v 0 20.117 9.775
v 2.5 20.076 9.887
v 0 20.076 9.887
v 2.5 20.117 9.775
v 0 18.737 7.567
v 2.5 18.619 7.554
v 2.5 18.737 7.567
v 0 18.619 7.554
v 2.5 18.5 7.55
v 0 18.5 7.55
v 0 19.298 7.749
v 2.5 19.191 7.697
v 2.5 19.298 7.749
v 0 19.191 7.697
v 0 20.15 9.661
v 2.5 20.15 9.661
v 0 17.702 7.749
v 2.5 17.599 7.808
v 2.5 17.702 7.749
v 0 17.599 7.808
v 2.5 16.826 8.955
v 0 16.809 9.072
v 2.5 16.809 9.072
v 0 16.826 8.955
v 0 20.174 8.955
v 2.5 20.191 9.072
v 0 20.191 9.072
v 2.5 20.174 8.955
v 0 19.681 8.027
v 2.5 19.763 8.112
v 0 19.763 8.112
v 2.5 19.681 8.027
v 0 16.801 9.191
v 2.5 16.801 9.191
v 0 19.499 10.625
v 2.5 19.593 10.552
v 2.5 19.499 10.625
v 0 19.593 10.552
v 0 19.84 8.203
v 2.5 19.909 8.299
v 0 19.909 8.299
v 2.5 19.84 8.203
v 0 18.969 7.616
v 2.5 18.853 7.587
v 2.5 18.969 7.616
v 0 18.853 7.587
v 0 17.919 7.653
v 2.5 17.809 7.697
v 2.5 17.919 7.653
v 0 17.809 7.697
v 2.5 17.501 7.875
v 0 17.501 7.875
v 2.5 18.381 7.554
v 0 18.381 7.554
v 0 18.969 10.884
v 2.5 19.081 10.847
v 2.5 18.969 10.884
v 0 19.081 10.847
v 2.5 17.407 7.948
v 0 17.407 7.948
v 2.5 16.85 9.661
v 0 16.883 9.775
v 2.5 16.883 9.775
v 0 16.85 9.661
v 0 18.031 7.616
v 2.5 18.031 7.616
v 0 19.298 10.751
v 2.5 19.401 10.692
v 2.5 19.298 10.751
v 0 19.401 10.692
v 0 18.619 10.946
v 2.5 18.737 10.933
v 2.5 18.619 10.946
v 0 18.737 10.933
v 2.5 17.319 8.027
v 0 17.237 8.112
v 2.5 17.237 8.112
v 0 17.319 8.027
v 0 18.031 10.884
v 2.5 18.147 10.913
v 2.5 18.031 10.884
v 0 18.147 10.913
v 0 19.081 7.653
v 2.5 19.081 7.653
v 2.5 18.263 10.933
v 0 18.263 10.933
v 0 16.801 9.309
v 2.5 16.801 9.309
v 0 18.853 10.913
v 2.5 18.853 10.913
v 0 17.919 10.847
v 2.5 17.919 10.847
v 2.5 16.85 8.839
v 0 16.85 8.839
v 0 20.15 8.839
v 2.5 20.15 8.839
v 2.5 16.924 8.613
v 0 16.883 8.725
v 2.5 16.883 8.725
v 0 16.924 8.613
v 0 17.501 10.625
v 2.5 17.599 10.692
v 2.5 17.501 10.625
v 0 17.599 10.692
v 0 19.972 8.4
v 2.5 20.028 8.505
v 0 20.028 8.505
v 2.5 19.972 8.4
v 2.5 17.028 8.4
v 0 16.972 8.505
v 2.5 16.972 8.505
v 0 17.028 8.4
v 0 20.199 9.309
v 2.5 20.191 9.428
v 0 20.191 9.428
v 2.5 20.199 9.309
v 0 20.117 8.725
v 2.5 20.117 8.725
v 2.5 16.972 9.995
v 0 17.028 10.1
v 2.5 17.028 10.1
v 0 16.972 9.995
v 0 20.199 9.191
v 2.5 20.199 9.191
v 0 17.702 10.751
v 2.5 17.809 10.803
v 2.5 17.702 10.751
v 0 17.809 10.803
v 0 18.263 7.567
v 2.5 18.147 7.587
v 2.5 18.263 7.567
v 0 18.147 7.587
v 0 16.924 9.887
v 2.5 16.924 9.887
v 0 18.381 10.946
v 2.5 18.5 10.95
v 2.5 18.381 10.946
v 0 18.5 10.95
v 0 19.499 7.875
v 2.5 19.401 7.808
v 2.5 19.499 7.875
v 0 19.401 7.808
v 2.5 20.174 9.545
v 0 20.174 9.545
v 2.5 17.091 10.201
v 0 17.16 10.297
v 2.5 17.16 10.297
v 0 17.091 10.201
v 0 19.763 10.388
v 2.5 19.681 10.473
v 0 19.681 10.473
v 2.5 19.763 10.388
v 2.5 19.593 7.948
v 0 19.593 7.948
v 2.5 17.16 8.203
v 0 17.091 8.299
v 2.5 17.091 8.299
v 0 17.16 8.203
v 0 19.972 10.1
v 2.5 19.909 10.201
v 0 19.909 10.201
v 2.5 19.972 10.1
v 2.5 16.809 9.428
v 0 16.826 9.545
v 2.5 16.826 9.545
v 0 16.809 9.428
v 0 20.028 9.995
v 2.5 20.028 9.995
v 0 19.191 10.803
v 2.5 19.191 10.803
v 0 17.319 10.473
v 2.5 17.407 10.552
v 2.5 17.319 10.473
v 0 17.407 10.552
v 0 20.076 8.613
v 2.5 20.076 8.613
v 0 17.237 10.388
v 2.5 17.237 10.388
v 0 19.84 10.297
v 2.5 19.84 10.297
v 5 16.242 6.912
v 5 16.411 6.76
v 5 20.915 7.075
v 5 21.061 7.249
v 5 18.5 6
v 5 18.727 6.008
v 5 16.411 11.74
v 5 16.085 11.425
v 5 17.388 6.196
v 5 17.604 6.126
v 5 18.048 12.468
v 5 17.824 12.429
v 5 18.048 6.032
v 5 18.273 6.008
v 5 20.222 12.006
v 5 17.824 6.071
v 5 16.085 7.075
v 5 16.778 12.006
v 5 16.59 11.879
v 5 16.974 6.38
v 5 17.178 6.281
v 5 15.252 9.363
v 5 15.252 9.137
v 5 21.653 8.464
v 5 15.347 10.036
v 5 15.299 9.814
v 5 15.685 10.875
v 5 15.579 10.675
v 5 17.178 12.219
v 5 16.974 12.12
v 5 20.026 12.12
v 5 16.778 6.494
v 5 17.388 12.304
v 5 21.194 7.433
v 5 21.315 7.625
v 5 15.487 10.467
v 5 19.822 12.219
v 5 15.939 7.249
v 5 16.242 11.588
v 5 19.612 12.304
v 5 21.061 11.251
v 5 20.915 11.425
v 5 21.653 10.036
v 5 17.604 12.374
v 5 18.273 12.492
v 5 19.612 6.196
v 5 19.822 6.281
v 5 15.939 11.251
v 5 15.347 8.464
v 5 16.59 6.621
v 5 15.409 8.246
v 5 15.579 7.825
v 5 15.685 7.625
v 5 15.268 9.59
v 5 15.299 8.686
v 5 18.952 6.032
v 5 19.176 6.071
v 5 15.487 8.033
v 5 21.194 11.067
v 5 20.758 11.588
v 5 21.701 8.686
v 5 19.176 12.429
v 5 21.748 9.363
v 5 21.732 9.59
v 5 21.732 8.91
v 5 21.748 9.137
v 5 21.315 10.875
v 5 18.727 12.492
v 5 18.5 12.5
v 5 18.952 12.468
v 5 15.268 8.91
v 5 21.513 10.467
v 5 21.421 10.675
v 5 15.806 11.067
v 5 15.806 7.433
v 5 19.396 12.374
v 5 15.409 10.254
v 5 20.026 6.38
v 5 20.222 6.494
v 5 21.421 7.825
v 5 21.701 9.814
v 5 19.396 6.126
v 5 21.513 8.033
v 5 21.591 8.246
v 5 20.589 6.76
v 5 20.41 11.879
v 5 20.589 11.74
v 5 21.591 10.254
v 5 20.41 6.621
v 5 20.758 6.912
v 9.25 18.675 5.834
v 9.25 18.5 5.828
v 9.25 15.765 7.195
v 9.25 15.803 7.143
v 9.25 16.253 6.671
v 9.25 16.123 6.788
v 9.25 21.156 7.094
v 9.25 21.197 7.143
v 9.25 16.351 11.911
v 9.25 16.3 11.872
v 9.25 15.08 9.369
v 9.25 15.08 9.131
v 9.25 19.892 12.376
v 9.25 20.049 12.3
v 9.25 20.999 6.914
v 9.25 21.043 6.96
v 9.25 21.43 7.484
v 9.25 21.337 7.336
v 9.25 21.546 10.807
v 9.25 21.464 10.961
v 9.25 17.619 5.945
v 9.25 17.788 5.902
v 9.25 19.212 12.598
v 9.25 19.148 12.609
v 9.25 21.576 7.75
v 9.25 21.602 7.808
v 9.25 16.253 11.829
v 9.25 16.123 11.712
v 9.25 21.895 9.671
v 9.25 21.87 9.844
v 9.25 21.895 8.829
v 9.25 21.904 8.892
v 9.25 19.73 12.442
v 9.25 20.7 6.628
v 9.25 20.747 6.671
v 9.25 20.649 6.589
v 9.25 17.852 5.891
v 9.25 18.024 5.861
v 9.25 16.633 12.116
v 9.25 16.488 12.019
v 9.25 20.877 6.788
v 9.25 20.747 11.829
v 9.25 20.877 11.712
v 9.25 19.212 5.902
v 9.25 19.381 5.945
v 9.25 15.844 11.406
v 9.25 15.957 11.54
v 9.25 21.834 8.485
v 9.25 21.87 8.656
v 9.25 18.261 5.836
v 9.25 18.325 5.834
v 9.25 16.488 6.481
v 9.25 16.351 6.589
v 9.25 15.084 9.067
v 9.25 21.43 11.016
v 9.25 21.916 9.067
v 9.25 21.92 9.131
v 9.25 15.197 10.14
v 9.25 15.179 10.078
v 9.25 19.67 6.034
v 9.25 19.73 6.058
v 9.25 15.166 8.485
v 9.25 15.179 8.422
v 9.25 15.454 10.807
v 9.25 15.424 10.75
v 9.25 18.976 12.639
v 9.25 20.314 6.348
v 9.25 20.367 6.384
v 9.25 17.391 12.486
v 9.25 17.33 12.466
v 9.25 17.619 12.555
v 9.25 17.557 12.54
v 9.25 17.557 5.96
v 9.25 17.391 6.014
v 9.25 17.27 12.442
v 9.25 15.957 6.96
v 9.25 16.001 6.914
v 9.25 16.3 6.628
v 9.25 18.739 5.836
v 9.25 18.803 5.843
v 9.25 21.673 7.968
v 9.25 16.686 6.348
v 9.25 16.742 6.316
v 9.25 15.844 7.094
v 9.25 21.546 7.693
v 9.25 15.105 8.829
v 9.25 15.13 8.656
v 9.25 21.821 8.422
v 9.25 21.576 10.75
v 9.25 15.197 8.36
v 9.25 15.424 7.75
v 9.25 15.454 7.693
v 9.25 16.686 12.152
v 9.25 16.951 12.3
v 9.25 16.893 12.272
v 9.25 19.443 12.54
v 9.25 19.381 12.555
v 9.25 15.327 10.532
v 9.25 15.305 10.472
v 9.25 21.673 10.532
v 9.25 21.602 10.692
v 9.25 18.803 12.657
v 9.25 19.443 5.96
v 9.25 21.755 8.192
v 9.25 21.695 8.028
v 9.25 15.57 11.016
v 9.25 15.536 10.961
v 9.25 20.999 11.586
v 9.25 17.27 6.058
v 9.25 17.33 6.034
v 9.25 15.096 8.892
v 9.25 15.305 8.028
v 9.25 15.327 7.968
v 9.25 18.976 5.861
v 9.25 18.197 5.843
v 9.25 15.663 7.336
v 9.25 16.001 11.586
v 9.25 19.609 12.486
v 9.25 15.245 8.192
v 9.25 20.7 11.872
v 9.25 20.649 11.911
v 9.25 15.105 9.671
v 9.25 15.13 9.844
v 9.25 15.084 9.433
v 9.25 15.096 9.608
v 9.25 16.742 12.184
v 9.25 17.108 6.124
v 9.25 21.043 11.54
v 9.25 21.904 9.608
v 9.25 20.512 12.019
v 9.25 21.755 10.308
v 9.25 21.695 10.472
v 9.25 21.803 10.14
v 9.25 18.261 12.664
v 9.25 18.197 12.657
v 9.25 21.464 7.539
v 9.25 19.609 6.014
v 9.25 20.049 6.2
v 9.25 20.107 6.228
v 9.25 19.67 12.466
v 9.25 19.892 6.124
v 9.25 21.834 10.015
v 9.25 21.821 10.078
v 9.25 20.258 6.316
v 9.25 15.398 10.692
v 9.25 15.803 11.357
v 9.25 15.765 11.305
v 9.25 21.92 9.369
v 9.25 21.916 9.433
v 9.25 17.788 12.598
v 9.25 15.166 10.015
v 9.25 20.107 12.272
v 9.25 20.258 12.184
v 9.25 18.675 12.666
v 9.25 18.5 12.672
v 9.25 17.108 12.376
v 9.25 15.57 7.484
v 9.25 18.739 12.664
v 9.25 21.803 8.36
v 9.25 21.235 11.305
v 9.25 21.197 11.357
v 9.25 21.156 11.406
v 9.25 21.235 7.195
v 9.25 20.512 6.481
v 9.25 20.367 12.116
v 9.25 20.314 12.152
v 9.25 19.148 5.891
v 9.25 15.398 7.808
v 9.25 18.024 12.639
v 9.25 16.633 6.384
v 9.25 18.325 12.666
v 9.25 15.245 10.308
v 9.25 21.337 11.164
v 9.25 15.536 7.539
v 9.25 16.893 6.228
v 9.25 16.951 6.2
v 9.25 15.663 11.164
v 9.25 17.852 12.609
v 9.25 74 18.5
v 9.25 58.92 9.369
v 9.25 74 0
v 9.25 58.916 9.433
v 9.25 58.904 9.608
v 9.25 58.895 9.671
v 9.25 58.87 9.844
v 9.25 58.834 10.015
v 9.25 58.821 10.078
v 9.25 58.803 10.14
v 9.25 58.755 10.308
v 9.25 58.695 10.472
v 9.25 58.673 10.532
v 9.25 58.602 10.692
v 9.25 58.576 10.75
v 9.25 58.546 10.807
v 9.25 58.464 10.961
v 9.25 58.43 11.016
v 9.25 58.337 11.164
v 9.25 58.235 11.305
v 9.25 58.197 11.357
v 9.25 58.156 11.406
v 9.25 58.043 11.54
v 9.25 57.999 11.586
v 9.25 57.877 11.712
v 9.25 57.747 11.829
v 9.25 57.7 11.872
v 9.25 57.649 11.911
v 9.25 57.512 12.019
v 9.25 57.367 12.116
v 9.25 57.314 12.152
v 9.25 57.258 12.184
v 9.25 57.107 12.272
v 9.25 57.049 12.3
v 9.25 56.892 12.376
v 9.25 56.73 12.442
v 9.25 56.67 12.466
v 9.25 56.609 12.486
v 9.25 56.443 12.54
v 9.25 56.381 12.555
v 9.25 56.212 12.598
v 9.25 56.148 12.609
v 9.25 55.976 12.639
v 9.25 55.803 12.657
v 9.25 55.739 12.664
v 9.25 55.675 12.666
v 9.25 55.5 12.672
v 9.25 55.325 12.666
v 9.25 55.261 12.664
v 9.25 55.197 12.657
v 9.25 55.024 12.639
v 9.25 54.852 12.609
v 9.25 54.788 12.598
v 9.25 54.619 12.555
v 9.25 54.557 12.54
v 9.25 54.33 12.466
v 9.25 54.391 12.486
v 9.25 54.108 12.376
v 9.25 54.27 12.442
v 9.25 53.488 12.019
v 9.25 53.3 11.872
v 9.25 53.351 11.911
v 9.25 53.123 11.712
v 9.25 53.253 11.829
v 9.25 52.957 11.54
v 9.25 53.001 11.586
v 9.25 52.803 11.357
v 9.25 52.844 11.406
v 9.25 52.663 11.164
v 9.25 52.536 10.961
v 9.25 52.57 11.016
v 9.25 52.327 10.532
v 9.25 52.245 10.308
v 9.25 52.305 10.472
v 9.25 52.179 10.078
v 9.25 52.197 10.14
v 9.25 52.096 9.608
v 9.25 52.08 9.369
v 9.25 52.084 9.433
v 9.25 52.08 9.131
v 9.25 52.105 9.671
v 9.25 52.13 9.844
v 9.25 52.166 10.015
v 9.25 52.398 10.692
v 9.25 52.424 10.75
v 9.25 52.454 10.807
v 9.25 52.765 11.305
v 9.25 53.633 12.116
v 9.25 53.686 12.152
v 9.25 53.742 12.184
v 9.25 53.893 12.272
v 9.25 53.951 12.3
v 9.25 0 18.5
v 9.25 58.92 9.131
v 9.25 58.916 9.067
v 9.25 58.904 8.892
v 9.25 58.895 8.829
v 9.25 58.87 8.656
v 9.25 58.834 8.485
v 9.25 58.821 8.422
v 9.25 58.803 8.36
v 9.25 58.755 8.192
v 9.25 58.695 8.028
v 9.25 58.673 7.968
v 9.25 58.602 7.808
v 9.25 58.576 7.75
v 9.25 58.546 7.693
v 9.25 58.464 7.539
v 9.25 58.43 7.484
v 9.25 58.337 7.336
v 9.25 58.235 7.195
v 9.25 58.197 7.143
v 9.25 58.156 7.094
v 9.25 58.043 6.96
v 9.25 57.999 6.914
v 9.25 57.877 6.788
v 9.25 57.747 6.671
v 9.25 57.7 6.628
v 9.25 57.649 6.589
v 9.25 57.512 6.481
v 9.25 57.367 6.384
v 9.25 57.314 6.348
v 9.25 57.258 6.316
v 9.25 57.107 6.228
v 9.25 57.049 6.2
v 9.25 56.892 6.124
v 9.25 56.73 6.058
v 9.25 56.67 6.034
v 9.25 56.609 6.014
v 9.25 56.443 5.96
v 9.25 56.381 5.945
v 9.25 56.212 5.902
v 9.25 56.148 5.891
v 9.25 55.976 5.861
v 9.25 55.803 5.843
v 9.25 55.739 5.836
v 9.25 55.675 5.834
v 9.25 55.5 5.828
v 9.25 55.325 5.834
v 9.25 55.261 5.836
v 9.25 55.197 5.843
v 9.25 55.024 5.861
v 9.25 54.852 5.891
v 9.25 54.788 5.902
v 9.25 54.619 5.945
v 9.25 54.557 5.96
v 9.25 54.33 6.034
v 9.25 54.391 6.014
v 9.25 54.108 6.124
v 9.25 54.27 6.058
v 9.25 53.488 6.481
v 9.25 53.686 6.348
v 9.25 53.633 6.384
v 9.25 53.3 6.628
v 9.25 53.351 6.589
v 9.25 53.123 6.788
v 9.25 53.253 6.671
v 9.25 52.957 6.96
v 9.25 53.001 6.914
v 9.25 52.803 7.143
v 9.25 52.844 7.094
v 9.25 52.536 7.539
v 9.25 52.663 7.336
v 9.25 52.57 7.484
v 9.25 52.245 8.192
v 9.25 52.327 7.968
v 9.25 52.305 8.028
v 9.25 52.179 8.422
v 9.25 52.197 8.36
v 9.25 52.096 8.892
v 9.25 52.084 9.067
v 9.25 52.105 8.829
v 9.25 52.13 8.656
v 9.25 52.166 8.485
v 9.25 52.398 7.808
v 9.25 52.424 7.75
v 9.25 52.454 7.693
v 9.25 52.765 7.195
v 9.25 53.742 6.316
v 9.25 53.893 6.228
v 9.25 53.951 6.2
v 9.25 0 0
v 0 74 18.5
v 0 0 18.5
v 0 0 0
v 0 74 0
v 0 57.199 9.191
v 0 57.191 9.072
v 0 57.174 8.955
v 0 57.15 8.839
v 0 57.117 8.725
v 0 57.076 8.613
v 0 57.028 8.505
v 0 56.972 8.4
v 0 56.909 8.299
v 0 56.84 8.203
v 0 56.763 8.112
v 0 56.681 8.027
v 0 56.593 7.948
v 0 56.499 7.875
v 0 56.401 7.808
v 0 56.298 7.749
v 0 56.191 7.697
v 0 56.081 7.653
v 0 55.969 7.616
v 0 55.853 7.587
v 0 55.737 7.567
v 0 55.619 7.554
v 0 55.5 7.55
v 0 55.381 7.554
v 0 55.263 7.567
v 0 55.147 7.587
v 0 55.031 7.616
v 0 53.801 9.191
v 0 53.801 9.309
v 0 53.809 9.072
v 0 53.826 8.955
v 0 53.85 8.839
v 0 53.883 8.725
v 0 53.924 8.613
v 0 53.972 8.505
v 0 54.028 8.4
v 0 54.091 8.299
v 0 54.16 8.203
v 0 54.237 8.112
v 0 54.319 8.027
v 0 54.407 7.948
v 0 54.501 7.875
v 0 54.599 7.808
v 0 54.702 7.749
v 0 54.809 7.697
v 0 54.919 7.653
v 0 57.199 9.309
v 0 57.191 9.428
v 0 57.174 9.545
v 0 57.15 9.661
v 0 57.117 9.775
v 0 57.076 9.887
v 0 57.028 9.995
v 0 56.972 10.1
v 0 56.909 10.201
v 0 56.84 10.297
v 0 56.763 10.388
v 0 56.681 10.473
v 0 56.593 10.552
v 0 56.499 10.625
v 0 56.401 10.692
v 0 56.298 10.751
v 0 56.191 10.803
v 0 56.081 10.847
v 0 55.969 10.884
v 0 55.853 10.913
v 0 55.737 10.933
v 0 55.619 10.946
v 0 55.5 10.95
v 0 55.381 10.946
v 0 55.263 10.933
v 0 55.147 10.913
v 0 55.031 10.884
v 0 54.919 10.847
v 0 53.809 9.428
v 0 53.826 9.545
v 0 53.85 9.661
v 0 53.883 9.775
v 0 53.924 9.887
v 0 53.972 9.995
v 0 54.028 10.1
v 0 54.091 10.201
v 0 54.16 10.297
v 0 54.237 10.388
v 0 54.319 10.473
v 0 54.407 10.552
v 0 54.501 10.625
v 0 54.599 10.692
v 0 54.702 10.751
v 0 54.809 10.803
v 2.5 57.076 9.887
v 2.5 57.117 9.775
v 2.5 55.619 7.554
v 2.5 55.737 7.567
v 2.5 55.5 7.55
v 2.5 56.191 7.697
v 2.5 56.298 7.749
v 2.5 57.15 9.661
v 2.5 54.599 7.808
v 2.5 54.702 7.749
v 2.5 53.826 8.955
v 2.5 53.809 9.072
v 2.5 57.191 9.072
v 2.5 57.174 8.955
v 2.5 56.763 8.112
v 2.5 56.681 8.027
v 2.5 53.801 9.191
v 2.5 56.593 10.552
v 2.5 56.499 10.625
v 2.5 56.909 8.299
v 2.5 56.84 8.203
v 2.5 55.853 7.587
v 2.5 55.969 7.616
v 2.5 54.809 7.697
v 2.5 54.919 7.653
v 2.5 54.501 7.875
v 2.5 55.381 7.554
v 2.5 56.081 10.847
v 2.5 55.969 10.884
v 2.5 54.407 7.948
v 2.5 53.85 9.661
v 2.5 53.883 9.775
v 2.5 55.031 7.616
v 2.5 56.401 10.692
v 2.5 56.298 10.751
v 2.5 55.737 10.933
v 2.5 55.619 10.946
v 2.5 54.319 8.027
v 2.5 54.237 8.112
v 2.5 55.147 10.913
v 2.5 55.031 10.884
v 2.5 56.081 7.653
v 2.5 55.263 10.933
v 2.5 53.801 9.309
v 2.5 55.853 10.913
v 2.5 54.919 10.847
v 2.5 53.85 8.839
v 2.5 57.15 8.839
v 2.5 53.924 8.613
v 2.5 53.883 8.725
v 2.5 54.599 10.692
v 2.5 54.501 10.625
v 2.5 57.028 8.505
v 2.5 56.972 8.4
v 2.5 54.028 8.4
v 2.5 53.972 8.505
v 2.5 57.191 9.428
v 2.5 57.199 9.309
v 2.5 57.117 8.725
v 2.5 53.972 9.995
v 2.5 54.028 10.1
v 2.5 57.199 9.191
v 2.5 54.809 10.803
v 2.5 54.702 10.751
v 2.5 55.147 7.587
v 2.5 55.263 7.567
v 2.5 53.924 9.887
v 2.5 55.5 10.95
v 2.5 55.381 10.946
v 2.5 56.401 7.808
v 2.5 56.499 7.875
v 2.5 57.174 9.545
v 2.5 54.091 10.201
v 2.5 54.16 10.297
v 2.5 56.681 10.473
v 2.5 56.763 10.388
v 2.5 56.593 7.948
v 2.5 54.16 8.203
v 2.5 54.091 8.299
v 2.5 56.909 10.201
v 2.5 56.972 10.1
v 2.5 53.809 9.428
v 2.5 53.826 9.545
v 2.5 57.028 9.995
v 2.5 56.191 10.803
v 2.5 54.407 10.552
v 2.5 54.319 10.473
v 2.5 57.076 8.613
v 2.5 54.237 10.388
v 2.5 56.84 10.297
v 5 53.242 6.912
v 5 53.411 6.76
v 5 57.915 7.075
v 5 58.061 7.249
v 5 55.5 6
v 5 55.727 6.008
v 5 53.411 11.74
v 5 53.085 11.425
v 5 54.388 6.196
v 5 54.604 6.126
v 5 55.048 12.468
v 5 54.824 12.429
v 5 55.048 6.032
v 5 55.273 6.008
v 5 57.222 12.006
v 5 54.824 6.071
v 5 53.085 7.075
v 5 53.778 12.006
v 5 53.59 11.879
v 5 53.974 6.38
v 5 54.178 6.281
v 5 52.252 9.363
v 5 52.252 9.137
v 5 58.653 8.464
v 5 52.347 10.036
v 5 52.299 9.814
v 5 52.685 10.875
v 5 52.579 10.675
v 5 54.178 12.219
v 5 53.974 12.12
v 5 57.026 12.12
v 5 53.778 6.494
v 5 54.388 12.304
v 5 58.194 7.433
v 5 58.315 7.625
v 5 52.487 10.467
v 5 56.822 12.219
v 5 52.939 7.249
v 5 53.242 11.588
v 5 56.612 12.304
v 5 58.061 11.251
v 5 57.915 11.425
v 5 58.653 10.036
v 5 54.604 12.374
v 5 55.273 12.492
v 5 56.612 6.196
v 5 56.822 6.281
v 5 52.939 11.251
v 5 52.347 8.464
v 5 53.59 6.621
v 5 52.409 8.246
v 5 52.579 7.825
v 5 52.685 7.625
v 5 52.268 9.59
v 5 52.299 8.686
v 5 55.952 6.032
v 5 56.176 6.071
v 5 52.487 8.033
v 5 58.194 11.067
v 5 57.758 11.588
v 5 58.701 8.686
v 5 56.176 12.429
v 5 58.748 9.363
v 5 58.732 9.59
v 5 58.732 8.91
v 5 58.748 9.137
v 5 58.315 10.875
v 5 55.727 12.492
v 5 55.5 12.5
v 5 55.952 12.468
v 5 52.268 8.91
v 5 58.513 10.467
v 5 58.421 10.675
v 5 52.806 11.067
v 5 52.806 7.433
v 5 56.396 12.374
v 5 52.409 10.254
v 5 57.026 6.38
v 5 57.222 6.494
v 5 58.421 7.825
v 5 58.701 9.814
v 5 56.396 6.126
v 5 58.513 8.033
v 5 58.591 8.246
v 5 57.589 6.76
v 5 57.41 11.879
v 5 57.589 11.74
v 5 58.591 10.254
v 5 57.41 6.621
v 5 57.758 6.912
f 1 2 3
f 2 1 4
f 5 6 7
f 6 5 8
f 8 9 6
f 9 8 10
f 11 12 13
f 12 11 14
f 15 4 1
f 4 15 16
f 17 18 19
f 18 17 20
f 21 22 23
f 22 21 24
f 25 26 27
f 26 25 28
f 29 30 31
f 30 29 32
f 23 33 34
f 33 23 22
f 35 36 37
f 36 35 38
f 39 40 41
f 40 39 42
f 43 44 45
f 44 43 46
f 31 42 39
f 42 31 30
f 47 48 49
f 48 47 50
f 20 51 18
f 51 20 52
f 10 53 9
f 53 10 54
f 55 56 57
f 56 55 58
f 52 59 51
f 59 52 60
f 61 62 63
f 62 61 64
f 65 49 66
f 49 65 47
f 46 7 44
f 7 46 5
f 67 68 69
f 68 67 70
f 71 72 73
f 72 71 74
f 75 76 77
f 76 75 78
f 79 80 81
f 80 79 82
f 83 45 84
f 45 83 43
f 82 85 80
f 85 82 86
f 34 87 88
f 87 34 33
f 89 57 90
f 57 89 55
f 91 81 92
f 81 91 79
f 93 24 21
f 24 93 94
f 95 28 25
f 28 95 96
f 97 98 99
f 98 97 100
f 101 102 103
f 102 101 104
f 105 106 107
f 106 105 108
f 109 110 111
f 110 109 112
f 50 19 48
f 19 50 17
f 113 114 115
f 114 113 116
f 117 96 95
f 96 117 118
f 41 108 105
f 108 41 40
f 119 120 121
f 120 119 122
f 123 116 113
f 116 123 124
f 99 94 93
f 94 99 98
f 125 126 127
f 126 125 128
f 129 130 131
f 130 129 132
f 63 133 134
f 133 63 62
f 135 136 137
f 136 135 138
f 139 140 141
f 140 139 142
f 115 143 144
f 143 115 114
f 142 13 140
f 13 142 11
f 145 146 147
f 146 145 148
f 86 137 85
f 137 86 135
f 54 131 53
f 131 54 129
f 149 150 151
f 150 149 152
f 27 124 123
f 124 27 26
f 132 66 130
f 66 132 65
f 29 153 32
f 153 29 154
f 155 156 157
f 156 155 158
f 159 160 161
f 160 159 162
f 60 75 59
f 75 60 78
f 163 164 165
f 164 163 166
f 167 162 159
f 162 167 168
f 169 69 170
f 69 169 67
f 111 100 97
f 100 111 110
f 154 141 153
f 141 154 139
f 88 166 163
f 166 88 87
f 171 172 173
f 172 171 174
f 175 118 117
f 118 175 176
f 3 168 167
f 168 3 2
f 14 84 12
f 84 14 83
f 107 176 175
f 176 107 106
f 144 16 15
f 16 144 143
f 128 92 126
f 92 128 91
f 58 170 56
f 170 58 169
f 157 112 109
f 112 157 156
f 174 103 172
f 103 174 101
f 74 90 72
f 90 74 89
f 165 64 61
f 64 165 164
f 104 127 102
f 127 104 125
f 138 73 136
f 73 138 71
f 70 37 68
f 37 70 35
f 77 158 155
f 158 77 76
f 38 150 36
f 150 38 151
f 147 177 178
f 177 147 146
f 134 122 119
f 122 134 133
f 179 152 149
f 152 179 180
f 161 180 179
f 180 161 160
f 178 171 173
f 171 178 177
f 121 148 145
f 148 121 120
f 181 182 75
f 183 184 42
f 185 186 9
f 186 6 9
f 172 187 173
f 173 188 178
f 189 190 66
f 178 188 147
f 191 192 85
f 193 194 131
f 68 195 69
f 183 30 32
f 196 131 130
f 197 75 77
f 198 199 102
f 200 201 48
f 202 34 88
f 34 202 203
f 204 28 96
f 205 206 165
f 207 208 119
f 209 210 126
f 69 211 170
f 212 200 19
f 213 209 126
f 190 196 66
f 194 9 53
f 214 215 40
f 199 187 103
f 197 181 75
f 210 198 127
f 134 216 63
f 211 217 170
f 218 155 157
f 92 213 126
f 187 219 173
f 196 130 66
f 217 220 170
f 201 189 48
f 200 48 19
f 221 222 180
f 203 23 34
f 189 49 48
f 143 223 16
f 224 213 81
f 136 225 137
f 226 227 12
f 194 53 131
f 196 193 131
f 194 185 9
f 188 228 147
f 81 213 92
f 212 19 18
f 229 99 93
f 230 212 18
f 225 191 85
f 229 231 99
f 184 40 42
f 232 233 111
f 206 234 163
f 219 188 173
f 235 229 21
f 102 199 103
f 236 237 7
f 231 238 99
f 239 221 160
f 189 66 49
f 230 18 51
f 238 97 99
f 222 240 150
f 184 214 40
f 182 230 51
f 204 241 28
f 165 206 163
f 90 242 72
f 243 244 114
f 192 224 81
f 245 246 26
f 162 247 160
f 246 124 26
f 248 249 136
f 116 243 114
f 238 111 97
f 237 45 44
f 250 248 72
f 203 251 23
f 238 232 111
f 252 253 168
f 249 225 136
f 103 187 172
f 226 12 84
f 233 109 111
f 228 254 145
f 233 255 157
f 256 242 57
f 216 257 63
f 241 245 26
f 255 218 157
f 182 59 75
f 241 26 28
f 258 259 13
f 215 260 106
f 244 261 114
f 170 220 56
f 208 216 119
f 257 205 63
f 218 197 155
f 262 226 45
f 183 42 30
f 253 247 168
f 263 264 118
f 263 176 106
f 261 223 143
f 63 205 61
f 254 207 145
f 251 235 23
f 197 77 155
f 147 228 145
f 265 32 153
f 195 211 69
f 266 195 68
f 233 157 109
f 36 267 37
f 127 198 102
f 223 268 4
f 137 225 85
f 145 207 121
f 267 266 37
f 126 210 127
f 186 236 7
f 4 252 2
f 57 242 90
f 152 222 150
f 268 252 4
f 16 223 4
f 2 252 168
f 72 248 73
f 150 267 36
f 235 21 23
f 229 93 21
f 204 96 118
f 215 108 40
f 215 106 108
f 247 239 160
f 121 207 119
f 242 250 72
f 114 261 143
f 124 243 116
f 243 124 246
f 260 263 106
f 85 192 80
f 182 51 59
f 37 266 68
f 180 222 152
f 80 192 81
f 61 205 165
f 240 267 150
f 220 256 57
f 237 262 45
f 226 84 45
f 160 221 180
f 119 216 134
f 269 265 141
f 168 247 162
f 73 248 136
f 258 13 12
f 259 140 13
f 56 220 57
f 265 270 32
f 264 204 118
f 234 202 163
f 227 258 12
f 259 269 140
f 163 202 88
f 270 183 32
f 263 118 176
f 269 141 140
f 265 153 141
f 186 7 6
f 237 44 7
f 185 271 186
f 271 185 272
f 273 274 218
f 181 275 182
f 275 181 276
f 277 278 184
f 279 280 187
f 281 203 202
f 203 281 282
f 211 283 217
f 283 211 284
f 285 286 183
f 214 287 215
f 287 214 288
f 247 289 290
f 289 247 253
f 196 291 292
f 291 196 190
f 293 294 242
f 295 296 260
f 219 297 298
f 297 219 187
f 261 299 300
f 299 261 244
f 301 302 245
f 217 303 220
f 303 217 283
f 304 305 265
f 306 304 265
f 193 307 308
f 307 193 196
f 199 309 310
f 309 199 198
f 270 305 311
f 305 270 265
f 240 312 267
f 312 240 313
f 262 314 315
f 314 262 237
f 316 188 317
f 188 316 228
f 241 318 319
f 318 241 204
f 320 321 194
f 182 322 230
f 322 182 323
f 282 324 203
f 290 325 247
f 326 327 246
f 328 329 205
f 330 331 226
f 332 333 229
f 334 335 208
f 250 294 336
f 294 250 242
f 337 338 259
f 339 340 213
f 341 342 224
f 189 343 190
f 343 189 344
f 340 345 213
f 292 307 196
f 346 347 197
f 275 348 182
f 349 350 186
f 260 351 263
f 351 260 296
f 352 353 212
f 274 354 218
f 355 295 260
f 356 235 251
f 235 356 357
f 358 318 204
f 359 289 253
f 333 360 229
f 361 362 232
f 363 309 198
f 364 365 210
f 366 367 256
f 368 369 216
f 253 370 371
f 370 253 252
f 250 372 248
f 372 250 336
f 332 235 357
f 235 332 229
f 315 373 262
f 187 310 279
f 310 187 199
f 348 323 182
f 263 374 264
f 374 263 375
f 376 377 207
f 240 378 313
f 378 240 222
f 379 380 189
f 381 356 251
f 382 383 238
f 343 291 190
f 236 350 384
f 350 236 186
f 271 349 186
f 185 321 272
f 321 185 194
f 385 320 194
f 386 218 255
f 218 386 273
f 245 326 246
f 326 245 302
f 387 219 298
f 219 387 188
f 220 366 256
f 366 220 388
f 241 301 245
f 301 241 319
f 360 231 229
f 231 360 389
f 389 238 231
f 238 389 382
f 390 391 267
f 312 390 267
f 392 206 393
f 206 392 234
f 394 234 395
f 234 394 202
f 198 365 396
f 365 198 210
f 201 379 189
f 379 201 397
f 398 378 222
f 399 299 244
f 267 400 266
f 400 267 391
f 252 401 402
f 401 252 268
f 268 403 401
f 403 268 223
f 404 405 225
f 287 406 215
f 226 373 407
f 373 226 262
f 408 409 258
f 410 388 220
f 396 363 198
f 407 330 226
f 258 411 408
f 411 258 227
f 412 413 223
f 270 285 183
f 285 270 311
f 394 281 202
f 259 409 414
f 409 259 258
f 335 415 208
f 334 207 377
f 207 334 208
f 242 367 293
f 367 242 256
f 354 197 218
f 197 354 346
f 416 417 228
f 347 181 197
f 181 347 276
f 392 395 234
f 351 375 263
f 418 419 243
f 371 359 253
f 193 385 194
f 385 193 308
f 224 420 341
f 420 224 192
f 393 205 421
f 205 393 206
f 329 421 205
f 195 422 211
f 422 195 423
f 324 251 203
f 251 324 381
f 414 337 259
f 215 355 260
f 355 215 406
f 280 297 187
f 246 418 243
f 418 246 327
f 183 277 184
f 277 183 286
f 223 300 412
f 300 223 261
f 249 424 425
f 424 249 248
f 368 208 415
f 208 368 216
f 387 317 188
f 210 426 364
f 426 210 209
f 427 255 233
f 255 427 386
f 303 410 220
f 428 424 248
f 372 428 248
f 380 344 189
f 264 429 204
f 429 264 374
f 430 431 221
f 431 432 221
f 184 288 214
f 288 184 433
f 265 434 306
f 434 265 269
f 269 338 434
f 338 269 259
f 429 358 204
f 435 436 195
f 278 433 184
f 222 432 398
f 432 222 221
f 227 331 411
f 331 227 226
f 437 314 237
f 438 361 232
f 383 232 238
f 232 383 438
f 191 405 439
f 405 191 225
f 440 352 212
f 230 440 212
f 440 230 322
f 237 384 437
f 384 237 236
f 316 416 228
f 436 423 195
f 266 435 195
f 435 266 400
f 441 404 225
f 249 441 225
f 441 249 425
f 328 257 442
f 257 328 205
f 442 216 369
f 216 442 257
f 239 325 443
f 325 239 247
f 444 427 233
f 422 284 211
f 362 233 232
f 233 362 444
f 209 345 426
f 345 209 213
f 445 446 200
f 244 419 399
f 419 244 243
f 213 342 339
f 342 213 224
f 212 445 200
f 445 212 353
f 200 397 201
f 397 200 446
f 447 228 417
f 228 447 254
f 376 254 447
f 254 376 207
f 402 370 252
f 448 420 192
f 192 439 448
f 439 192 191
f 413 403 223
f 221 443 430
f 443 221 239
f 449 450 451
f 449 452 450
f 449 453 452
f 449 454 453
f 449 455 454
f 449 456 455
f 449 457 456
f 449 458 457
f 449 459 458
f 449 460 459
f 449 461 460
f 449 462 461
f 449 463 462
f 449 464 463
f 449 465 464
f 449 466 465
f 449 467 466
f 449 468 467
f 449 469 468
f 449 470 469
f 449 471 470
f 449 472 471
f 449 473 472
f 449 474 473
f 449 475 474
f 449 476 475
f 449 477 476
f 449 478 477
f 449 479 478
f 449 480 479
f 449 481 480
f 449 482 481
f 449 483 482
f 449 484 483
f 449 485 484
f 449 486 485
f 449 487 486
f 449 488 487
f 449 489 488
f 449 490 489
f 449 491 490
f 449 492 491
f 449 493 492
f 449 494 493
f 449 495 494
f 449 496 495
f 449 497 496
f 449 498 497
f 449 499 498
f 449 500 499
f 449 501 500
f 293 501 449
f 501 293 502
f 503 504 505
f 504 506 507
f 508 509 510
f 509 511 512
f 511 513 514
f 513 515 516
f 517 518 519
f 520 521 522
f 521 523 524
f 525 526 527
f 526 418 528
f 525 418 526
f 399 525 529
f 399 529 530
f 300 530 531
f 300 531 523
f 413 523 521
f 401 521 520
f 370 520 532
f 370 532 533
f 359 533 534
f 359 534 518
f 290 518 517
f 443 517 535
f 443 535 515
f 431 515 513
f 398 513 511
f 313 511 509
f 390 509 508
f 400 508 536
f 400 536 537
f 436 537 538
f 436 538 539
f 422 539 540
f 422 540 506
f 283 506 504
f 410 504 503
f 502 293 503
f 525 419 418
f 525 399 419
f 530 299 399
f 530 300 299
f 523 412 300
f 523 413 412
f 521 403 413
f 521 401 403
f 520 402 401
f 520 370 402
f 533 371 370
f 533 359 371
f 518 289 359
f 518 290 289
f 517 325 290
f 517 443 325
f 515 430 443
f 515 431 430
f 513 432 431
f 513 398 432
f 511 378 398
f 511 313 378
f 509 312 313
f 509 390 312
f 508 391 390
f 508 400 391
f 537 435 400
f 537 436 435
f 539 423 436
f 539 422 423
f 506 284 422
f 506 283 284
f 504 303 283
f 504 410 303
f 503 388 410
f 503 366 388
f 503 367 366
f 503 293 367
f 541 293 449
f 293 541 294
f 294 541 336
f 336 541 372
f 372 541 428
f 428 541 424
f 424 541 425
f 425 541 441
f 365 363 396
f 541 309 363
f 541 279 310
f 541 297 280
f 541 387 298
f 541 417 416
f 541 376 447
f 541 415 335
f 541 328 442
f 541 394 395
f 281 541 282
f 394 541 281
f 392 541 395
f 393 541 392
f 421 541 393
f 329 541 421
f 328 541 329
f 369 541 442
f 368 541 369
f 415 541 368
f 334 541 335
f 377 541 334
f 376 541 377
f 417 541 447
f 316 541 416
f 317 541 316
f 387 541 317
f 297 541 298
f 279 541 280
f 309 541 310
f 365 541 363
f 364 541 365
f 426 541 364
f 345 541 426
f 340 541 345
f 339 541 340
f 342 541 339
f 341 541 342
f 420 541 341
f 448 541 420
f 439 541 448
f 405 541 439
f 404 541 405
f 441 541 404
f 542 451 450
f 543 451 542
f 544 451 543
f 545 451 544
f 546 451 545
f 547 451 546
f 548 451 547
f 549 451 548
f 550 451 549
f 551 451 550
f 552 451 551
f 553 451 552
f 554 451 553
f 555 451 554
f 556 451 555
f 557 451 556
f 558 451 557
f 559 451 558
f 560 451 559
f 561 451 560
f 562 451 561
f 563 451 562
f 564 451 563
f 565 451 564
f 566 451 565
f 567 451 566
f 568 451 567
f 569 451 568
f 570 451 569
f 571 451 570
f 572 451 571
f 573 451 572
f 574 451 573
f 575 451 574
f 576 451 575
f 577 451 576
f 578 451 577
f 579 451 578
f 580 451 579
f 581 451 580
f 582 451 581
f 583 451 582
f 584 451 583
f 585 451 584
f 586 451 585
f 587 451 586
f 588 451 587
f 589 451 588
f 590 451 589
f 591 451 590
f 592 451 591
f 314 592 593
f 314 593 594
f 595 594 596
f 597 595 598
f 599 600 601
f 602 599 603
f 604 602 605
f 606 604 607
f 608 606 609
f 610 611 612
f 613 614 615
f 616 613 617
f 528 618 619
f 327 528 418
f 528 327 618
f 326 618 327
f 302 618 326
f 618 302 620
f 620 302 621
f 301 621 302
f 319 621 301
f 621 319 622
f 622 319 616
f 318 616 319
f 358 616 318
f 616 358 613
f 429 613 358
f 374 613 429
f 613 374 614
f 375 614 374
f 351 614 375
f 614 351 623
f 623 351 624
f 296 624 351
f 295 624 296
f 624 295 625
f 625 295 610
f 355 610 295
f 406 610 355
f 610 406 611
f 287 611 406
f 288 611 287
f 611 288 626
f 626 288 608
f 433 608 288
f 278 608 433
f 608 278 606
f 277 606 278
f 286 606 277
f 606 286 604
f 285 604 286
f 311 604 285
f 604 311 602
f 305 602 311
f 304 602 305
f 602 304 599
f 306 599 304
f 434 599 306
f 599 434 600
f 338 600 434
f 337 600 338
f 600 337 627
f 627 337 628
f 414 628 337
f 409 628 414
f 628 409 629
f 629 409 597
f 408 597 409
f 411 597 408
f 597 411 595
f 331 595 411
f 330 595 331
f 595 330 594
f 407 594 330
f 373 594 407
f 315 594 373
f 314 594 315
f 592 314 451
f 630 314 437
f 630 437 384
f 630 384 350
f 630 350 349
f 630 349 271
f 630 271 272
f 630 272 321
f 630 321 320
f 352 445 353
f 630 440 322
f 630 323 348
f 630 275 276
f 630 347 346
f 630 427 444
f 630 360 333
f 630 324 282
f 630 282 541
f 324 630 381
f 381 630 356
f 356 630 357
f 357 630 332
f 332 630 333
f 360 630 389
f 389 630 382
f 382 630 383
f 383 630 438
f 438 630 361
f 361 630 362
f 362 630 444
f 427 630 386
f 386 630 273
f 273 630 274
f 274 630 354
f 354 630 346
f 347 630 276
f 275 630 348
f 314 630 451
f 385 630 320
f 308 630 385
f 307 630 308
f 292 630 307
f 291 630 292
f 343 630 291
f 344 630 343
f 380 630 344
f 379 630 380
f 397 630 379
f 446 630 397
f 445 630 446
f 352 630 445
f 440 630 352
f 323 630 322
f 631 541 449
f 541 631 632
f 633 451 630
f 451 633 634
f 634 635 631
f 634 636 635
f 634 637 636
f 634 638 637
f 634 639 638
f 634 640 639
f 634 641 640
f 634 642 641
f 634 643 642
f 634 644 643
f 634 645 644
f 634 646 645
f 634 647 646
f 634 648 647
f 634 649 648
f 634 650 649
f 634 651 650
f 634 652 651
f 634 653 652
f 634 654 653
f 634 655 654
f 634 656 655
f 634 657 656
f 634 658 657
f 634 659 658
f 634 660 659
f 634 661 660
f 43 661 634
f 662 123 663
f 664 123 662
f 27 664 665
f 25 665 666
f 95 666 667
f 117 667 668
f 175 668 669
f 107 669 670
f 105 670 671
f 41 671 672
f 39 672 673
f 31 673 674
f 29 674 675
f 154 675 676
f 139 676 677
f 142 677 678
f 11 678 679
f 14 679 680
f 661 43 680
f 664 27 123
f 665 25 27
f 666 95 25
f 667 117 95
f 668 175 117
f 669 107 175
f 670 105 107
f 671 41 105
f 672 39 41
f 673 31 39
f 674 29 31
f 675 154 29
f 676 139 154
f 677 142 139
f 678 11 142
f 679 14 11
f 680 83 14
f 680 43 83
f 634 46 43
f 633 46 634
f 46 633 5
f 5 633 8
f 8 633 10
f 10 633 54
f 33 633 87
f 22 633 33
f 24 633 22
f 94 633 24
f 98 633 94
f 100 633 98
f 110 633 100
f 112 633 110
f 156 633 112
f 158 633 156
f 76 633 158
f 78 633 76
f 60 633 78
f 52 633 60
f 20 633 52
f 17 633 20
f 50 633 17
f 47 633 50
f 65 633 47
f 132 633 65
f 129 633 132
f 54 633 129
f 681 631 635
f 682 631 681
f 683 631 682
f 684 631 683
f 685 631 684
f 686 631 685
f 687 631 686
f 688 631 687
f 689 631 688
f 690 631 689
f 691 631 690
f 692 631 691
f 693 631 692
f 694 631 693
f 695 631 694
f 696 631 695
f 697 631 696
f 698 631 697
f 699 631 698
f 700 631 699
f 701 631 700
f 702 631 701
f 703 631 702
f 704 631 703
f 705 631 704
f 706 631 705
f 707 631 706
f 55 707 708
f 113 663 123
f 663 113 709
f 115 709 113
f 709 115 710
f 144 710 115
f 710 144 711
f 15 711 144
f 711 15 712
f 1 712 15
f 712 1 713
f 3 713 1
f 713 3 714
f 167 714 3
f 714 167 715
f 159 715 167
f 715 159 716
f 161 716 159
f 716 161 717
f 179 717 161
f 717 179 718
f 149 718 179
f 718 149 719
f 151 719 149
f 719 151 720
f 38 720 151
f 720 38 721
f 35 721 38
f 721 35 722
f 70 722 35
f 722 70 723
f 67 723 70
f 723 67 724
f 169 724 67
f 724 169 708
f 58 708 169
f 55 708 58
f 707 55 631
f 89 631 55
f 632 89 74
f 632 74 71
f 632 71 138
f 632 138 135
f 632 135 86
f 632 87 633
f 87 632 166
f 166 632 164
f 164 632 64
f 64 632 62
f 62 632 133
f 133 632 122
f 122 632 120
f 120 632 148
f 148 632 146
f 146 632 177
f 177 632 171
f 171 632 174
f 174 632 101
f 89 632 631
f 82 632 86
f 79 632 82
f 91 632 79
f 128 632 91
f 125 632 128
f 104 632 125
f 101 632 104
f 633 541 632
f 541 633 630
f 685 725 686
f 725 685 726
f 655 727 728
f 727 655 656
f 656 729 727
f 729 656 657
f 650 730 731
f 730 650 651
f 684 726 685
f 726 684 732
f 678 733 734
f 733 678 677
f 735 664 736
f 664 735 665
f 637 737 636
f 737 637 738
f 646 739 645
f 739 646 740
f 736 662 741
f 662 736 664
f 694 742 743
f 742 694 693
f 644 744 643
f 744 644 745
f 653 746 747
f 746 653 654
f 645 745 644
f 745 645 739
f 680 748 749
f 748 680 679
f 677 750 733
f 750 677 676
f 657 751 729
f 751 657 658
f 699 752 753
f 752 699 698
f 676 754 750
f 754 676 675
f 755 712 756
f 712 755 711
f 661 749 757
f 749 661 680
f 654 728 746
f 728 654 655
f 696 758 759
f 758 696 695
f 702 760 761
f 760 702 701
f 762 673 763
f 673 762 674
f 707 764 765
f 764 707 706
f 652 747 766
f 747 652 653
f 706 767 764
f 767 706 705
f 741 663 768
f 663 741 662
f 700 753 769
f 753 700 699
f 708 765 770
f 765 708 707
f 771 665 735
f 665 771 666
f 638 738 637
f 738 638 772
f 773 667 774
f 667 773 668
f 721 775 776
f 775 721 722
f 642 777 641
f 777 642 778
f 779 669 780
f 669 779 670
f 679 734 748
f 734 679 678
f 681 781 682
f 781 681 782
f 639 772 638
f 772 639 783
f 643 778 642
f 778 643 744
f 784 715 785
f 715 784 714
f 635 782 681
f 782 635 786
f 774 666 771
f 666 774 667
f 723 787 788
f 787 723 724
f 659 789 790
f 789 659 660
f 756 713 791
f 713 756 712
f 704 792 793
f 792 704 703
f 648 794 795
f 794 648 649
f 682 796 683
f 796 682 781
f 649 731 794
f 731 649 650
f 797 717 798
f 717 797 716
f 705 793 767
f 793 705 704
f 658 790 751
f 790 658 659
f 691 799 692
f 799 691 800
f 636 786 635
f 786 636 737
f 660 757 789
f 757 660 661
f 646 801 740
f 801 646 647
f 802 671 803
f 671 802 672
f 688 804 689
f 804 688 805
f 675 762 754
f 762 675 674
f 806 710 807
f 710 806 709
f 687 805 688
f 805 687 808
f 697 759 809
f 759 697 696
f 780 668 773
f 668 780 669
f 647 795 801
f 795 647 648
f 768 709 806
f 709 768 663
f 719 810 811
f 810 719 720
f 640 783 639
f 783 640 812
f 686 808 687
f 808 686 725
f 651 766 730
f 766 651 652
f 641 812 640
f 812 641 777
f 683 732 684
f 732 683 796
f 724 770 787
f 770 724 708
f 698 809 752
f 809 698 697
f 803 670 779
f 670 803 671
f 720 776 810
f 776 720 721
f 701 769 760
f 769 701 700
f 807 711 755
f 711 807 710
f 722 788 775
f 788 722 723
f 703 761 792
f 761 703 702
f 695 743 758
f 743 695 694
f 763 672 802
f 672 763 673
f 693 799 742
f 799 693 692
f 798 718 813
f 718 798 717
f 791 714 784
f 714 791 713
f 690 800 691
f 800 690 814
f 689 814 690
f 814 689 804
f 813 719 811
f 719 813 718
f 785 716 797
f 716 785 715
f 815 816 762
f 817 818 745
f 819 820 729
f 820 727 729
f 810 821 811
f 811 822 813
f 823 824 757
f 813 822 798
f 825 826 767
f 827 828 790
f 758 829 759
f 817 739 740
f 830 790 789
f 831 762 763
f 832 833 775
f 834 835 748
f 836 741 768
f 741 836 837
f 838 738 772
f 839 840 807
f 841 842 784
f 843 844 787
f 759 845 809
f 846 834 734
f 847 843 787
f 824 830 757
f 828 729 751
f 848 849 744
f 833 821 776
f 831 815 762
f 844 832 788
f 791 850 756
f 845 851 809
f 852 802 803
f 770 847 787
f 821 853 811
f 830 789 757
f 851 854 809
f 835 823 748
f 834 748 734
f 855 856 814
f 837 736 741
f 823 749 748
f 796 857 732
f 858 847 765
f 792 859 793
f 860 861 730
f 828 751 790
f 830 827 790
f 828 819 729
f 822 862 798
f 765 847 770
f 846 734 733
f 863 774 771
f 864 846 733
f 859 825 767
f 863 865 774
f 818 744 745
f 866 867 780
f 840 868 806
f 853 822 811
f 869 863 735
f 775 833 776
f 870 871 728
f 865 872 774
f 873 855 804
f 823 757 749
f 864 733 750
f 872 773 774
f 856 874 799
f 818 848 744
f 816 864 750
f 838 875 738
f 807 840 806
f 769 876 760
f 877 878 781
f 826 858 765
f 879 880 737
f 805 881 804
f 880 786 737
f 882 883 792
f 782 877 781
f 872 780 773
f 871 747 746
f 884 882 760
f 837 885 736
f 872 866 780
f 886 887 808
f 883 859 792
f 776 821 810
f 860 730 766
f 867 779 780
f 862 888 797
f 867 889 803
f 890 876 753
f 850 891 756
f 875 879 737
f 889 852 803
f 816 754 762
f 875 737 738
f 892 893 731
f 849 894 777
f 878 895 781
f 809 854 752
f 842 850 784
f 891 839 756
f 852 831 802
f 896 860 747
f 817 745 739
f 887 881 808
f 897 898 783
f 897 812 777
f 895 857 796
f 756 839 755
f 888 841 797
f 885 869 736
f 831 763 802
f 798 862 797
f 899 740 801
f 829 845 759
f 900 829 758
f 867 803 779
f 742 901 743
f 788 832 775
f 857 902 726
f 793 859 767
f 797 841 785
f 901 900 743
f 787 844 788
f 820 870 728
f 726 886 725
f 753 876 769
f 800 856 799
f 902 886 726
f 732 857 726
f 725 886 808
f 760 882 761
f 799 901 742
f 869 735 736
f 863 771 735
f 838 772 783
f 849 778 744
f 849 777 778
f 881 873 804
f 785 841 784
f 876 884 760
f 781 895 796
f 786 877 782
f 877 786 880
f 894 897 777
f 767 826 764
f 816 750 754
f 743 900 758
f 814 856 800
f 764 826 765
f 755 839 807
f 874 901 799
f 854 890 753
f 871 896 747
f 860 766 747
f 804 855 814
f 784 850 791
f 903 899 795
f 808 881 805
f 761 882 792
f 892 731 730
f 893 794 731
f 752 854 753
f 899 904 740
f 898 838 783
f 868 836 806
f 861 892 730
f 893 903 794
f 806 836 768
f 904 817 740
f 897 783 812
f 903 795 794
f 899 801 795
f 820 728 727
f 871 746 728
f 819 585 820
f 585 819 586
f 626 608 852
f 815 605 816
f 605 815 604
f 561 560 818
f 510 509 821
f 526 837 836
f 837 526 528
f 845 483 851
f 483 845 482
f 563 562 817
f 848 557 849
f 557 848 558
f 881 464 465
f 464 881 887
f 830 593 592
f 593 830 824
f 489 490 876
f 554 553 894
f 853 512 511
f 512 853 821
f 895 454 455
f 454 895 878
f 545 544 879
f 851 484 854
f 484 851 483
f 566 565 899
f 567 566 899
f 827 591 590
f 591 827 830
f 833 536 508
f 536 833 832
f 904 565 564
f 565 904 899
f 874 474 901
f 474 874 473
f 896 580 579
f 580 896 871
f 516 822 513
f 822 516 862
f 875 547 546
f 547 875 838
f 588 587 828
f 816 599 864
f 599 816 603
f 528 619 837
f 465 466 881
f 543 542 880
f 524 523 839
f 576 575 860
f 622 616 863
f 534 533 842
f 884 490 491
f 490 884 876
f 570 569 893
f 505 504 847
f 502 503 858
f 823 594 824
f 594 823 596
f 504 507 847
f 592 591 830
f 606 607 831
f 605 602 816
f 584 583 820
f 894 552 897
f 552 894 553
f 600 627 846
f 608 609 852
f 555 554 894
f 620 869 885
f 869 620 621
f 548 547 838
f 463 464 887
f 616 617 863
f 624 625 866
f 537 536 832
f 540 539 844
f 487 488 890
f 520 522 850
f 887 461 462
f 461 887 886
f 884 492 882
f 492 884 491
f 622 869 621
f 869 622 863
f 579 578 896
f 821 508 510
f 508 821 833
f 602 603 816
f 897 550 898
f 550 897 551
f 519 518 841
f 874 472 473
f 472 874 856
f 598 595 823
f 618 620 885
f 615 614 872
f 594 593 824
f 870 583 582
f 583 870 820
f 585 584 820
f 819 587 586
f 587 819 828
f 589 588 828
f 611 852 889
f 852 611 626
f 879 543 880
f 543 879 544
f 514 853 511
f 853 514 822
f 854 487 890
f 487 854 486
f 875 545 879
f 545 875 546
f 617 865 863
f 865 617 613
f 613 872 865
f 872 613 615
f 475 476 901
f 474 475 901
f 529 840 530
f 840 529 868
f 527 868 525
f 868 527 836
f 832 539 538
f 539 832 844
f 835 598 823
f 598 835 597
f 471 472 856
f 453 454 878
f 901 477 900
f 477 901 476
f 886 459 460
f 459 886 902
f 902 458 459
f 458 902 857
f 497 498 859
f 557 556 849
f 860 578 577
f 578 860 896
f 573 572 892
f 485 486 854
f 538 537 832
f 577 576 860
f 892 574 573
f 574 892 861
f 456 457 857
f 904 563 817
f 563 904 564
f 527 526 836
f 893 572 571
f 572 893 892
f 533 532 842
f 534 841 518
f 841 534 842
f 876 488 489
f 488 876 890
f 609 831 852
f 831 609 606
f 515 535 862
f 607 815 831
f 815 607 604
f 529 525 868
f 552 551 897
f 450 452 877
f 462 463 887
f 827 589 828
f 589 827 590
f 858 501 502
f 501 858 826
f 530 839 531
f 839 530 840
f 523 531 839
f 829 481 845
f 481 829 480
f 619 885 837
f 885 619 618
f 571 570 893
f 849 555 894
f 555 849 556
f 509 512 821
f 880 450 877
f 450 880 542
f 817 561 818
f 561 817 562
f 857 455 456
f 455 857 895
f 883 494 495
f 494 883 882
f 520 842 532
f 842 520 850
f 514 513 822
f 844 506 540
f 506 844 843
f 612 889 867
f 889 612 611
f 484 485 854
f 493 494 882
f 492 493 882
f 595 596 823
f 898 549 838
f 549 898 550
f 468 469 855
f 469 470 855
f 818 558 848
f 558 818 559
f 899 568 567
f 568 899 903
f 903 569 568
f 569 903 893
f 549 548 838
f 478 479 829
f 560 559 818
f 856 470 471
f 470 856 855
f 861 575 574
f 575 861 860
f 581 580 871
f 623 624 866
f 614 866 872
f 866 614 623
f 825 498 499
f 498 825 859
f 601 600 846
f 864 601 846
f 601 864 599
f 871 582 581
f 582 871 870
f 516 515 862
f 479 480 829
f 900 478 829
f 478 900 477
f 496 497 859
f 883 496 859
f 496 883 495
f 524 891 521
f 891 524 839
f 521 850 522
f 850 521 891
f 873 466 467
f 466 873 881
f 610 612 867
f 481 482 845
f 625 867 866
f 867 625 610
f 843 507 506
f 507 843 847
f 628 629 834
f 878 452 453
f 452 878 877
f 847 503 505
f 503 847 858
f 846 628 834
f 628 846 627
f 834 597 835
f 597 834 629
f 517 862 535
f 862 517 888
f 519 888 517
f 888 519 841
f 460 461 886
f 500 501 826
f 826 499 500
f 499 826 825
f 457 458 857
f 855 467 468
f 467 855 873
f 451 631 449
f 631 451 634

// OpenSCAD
//Schreibtischeckhalter2
$fn=90;
//Dicke Schreibtischplatte
d1=37;
//Dicke Brett
d2=18.5;
//Dicke Schreibtischplatte hinten ab Blech noch
d3=15;
//Dicke Blech
db=2.3;
//Durchmesser Schraube
ds=3.4;
//Kopfhöhe Schraube
khs=2.5;
//Durchmesser Schraubenkopf
dsk=6.5;
//Durchmesser Bit
dbit=8;


//Höhe Eckhalter
he=d1-d2;
//Breite Eckhalter
be=he; //wir nehmen mal die Höhe als Breite auch
te=he; //hier genauso

module schraube()
{
    
    {
    cylinder(h=he, d=ds);
    translate([0,0,he])
    cylinder(h=khs, d1=ds, d2=dsk);
    
    translate([0,0,he+khs])
    cylinder(h=he, d1=dsk, d2=dbit);
    }
}

module ecke()
{
cube([d2/2,d2*2,d2]);
}

module schrauben()
{
translate([-he+khs,d2,d2/2])
rotate([0,90,0])
schraube();

}

module part()
{
difference()
{
    ecke();
    schrauben();
}
}

part();
translate([0,d2*2,0])
part();
